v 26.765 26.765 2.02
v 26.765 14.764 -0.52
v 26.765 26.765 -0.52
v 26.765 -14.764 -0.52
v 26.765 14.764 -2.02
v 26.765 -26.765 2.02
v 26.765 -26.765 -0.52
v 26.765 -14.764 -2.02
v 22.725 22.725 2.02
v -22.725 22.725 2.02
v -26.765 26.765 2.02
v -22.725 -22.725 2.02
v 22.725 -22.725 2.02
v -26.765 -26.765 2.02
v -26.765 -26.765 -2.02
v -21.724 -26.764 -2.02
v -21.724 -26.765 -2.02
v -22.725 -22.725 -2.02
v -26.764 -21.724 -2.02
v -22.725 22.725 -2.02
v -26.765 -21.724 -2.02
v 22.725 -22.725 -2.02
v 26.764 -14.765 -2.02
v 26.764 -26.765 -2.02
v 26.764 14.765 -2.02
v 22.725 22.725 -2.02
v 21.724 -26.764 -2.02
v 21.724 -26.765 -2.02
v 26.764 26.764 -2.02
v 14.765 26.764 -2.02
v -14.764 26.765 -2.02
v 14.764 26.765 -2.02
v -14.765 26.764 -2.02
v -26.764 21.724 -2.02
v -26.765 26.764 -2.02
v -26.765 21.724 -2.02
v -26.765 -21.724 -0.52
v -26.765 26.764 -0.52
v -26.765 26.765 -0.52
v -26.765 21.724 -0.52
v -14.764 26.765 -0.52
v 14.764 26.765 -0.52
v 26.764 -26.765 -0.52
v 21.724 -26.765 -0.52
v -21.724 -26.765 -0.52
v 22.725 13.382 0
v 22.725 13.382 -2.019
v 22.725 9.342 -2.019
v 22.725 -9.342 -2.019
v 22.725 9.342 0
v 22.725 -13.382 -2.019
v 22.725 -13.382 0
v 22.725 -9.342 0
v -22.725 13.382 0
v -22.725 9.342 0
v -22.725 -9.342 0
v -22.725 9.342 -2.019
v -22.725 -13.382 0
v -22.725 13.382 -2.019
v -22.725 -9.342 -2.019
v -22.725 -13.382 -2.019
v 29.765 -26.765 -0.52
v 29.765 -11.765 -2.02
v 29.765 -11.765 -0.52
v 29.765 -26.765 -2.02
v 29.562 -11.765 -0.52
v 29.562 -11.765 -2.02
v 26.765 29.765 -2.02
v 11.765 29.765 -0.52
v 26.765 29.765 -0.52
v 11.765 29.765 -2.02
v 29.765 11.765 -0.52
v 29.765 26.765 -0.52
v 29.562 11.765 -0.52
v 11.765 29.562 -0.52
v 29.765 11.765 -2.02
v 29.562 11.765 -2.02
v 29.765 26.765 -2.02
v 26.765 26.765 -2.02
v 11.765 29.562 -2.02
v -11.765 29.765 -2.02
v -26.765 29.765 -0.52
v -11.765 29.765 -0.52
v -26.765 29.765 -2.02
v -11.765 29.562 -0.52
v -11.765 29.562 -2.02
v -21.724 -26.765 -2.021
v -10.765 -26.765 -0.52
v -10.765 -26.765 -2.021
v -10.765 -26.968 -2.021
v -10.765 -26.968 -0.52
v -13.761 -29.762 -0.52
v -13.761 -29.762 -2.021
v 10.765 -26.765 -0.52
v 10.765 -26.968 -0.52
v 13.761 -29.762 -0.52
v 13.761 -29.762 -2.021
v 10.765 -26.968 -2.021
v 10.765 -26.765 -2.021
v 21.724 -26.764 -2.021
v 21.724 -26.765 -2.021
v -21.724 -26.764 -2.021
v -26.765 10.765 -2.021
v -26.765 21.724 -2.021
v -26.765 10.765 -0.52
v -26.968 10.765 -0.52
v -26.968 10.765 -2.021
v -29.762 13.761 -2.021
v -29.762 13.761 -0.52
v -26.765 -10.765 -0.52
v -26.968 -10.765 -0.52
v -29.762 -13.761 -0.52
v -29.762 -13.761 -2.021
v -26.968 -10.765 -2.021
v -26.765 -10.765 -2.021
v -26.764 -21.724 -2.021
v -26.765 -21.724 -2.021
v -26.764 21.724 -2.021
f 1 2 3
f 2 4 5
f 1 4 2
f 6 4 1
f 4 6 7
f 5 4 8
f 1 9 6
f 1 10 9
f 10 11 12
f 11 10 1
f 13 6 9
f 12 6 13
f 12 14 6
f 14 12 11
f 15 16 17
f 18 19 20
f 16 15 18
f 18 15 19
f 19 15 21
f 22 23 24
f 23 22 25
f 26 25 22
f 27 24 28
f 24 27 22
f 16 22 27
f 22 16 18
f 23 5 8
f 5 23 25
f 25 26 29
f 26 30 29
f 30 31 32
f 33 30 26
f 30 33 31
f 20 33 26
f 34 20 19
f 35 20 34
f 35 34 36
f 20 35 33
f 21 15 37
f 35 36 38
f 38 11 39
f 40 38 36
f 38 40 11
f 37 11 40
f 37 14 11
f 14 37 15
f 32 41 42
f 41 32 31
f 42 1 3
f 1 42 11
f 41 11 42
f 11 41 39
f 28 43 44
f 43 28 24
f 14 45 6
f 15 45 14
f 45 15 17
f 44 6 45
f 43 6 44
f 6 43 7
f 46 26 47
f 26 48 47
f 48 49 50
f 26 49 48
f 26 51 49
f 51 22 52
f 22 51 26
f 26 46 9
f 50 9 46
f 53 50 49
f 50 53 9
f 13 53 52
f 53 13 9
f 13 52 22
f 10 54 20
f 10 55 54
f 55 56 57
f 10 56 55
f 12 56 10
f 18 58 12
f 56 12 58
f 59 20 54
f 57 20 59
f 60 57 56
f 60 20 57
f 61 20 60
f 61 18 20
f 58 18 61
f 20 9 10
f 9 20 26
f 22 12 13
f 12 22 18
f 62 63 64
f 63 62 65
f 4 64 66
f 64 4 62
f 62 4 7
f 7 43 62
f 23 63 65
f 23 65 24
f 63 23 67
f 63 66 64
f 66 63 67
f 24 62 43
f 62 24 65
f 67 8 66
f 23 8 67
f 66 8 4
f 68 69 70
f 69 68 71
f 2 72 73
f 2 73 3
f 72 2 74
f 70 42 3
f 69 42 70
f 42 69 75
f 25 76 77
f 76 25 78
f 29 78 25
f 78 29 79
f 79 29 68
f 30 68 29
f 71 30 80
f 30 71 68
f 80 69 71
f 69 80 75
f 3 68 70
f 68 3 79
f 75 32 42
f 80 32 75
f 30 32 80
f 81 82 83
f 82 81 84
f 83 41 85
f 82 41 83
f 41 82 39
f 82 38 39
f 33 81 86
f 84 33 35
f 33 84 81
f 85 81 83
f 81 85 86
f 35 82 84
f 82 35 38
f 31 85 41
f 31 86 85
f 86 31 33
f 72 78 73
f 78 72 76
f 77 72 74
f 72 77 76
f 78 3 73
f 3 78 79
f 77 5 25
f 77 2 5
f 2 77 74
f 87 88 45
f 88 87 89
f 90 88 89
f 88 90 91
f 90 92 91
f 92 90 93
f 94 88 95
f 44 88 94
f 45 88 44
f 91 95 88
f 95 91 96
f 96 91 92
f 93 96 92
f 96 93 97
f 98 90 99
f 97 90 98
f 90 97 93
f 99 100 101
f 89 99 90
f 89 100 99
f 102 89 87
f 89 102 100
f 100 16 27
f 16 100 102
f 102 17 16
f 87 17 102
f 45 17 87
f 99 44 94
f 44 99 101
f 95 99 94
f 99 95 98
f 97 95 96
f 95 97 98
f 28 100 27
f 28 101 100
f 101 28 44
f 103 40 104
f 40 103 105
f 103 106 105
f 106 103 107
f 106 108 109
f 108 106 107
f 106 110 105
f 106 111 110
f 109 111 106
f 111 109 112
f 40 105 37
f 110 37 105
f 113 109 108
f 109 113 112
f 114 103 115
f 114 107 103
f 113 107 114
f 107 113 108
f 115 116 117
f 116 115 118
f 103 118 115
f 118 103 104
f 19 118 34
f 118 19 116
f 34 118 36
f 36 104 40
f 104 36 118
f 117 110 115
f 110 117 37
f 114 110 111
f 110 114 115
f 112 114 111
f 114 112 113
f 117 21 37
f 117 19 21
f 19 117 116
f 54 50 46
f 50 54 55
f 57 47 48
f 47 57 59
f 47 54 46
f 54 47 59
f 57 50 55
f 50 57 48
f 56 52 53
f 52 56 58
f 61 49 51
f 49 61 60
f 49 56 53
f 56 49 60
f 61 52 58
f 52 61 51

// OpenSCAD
// Interlocking tile holder

// The size of the tile
Tile_Width = 45;
Tile_Length = 45;
Tile_Height = 2;

// The size of the connectors
connect_width = 15;
connect_height = 1.5;
connect_length = 3;
connect_angle = 47;

// The fit 
tile_fit = 1.01;

// The size of the tile
tile_width = Tile_Width * tile_fit;
tile_length = Tile_Length * tile_fit;
tile_height = Tile_Height * tile_fit;

holder_height = tile_height * 2;
holder_thickness = holder_height;

bar_height = holder_thickness / 2;
bar_width = holder_thickness;

// Overlap factor
diff_factor = .001;

// Always have the longest/shortest edge in the same direction
if(tile_width < tile_length) {
    holder(tile_width, tile_length);
} else {
    holder(tile_length, tile_width);
}

// Create the holder
module holder(tw, tl) {
    union() {
        //Base plate
        difference() {
            cube(
                [
                    tw + 2 * holder_thickness,
                    tl + 2 * holder_thickness,
                    holder_height
                ],
                center = true);

            cube(
                [
                    tw,
                    tl,
                    holder_height + diff_factor
                ],
                center = true);
        }

        // Bars
        bar_pos = tl / 4;

        bar(bar_pos, tw, tl);
        bar(-bar_pos, tw, tl);
        
        // Connectors
        female_horizontal(tw, tl, 0, 0, 0);
        female_vertical(tw, tl, 0, 0, 0);
        
        male_horizontal(tw, tl);
        male_vertical(tw, tl);
    }
};


module male_vertical(tw, tl)
{
    rotate([0, 0, -90])
        male_horizontal(tl, tw);
}

module male_horizontal(tw, tl)
{
    translate([1, 0, 0])
    {
        difference() {
            edge(tw, tl);
            connector(tw, tl);
        }
    }
    
    translate([-1, 0, 0]) {
        mirror([1, 0, 0]) {
            difference() {
                edge(tw, tl);
                connector(tw, tl);
            }
        }
    }
}

module connector(tw, tl)
{
    translate(
        [
            0,
            -tl - 2 * holder_thickness - connect_length,
            -diff_factor
        ])
    {
        female_horizontal(tw, tl, 0, 0, 2);
    }
}

module edge(tw, tl) {
    translate(
        [
            0,
            -tl / 2 - holder_thickness + diff_factor,
            -holder_thickness / 2 - diff_factor
        ])
    {
        rotate(180) {
            cube(
                [
                    tw / 2 - diff_factor,
                    connect_length - 2 * diff_factor,
                    connect_height + diff_factor
                ]);
        }
    }
}


module female_horizontal(tw, tl, extra_width, extra_length, extra_height)
{   
    rotate([0, 0, 90])
        vertical_corner(tl, tw, extra_width, extra_length, extra_height);

    mirror([1, 0, 0])
        rotate([0, 0, 90])
            vertical_corner(tl, tw, extra_width, extra_length, extra_height);
}

module female_vertical(tw, tl, extra_width, extra_length, extra_height)
{   
    vertical_corner(tw, tl, extra_width, extra_length, extra_height);

    mirror([0, 1, 0])
        vertical_corner(tw, tl, extra_width, extra_length, extra_height);
}

module vertical_corner(tw, tl, extra_width, extra_length, extra_height)
{
    angle_sides = connect_width + connect_length + extra_width + extra_length;

    translate(
        [
            tw / 2 + holder_thickness - diff_factor,
            -tl / 2 - holder_thickness,
            -holder_thickness / 2 - extra_height
        ])
    {
        difference() {
            cube(
                [
                    connect_length + extra_length + diff_factor,
                    connect_width - extra_width,
                    connect_height + 2 * extra_height
                ]);

            translate(
                [
                    0,
                    connect_width - connect_length + extra_width,
                    -2 * connect_height
                ])
            {
                rotate(connect_angle)
                {
                    cube(
                        [
                            angle_sides + diff_factor,
                            angle_sides + diff_factor,
                            4 * (connect_height + extra_height)
                        ]);
                }
            }
        }
    }
}

module bar(pos, tw, tl)
{
    translate( [
        0,
        pos,
        -bar_height / 2
    ])
    {
        cube(
            [
                tw + 2 * (holder_thickness - diff_factor),
                bar_width,
                bar_height - diff_factor
            ],
            center = true);
    }
}
